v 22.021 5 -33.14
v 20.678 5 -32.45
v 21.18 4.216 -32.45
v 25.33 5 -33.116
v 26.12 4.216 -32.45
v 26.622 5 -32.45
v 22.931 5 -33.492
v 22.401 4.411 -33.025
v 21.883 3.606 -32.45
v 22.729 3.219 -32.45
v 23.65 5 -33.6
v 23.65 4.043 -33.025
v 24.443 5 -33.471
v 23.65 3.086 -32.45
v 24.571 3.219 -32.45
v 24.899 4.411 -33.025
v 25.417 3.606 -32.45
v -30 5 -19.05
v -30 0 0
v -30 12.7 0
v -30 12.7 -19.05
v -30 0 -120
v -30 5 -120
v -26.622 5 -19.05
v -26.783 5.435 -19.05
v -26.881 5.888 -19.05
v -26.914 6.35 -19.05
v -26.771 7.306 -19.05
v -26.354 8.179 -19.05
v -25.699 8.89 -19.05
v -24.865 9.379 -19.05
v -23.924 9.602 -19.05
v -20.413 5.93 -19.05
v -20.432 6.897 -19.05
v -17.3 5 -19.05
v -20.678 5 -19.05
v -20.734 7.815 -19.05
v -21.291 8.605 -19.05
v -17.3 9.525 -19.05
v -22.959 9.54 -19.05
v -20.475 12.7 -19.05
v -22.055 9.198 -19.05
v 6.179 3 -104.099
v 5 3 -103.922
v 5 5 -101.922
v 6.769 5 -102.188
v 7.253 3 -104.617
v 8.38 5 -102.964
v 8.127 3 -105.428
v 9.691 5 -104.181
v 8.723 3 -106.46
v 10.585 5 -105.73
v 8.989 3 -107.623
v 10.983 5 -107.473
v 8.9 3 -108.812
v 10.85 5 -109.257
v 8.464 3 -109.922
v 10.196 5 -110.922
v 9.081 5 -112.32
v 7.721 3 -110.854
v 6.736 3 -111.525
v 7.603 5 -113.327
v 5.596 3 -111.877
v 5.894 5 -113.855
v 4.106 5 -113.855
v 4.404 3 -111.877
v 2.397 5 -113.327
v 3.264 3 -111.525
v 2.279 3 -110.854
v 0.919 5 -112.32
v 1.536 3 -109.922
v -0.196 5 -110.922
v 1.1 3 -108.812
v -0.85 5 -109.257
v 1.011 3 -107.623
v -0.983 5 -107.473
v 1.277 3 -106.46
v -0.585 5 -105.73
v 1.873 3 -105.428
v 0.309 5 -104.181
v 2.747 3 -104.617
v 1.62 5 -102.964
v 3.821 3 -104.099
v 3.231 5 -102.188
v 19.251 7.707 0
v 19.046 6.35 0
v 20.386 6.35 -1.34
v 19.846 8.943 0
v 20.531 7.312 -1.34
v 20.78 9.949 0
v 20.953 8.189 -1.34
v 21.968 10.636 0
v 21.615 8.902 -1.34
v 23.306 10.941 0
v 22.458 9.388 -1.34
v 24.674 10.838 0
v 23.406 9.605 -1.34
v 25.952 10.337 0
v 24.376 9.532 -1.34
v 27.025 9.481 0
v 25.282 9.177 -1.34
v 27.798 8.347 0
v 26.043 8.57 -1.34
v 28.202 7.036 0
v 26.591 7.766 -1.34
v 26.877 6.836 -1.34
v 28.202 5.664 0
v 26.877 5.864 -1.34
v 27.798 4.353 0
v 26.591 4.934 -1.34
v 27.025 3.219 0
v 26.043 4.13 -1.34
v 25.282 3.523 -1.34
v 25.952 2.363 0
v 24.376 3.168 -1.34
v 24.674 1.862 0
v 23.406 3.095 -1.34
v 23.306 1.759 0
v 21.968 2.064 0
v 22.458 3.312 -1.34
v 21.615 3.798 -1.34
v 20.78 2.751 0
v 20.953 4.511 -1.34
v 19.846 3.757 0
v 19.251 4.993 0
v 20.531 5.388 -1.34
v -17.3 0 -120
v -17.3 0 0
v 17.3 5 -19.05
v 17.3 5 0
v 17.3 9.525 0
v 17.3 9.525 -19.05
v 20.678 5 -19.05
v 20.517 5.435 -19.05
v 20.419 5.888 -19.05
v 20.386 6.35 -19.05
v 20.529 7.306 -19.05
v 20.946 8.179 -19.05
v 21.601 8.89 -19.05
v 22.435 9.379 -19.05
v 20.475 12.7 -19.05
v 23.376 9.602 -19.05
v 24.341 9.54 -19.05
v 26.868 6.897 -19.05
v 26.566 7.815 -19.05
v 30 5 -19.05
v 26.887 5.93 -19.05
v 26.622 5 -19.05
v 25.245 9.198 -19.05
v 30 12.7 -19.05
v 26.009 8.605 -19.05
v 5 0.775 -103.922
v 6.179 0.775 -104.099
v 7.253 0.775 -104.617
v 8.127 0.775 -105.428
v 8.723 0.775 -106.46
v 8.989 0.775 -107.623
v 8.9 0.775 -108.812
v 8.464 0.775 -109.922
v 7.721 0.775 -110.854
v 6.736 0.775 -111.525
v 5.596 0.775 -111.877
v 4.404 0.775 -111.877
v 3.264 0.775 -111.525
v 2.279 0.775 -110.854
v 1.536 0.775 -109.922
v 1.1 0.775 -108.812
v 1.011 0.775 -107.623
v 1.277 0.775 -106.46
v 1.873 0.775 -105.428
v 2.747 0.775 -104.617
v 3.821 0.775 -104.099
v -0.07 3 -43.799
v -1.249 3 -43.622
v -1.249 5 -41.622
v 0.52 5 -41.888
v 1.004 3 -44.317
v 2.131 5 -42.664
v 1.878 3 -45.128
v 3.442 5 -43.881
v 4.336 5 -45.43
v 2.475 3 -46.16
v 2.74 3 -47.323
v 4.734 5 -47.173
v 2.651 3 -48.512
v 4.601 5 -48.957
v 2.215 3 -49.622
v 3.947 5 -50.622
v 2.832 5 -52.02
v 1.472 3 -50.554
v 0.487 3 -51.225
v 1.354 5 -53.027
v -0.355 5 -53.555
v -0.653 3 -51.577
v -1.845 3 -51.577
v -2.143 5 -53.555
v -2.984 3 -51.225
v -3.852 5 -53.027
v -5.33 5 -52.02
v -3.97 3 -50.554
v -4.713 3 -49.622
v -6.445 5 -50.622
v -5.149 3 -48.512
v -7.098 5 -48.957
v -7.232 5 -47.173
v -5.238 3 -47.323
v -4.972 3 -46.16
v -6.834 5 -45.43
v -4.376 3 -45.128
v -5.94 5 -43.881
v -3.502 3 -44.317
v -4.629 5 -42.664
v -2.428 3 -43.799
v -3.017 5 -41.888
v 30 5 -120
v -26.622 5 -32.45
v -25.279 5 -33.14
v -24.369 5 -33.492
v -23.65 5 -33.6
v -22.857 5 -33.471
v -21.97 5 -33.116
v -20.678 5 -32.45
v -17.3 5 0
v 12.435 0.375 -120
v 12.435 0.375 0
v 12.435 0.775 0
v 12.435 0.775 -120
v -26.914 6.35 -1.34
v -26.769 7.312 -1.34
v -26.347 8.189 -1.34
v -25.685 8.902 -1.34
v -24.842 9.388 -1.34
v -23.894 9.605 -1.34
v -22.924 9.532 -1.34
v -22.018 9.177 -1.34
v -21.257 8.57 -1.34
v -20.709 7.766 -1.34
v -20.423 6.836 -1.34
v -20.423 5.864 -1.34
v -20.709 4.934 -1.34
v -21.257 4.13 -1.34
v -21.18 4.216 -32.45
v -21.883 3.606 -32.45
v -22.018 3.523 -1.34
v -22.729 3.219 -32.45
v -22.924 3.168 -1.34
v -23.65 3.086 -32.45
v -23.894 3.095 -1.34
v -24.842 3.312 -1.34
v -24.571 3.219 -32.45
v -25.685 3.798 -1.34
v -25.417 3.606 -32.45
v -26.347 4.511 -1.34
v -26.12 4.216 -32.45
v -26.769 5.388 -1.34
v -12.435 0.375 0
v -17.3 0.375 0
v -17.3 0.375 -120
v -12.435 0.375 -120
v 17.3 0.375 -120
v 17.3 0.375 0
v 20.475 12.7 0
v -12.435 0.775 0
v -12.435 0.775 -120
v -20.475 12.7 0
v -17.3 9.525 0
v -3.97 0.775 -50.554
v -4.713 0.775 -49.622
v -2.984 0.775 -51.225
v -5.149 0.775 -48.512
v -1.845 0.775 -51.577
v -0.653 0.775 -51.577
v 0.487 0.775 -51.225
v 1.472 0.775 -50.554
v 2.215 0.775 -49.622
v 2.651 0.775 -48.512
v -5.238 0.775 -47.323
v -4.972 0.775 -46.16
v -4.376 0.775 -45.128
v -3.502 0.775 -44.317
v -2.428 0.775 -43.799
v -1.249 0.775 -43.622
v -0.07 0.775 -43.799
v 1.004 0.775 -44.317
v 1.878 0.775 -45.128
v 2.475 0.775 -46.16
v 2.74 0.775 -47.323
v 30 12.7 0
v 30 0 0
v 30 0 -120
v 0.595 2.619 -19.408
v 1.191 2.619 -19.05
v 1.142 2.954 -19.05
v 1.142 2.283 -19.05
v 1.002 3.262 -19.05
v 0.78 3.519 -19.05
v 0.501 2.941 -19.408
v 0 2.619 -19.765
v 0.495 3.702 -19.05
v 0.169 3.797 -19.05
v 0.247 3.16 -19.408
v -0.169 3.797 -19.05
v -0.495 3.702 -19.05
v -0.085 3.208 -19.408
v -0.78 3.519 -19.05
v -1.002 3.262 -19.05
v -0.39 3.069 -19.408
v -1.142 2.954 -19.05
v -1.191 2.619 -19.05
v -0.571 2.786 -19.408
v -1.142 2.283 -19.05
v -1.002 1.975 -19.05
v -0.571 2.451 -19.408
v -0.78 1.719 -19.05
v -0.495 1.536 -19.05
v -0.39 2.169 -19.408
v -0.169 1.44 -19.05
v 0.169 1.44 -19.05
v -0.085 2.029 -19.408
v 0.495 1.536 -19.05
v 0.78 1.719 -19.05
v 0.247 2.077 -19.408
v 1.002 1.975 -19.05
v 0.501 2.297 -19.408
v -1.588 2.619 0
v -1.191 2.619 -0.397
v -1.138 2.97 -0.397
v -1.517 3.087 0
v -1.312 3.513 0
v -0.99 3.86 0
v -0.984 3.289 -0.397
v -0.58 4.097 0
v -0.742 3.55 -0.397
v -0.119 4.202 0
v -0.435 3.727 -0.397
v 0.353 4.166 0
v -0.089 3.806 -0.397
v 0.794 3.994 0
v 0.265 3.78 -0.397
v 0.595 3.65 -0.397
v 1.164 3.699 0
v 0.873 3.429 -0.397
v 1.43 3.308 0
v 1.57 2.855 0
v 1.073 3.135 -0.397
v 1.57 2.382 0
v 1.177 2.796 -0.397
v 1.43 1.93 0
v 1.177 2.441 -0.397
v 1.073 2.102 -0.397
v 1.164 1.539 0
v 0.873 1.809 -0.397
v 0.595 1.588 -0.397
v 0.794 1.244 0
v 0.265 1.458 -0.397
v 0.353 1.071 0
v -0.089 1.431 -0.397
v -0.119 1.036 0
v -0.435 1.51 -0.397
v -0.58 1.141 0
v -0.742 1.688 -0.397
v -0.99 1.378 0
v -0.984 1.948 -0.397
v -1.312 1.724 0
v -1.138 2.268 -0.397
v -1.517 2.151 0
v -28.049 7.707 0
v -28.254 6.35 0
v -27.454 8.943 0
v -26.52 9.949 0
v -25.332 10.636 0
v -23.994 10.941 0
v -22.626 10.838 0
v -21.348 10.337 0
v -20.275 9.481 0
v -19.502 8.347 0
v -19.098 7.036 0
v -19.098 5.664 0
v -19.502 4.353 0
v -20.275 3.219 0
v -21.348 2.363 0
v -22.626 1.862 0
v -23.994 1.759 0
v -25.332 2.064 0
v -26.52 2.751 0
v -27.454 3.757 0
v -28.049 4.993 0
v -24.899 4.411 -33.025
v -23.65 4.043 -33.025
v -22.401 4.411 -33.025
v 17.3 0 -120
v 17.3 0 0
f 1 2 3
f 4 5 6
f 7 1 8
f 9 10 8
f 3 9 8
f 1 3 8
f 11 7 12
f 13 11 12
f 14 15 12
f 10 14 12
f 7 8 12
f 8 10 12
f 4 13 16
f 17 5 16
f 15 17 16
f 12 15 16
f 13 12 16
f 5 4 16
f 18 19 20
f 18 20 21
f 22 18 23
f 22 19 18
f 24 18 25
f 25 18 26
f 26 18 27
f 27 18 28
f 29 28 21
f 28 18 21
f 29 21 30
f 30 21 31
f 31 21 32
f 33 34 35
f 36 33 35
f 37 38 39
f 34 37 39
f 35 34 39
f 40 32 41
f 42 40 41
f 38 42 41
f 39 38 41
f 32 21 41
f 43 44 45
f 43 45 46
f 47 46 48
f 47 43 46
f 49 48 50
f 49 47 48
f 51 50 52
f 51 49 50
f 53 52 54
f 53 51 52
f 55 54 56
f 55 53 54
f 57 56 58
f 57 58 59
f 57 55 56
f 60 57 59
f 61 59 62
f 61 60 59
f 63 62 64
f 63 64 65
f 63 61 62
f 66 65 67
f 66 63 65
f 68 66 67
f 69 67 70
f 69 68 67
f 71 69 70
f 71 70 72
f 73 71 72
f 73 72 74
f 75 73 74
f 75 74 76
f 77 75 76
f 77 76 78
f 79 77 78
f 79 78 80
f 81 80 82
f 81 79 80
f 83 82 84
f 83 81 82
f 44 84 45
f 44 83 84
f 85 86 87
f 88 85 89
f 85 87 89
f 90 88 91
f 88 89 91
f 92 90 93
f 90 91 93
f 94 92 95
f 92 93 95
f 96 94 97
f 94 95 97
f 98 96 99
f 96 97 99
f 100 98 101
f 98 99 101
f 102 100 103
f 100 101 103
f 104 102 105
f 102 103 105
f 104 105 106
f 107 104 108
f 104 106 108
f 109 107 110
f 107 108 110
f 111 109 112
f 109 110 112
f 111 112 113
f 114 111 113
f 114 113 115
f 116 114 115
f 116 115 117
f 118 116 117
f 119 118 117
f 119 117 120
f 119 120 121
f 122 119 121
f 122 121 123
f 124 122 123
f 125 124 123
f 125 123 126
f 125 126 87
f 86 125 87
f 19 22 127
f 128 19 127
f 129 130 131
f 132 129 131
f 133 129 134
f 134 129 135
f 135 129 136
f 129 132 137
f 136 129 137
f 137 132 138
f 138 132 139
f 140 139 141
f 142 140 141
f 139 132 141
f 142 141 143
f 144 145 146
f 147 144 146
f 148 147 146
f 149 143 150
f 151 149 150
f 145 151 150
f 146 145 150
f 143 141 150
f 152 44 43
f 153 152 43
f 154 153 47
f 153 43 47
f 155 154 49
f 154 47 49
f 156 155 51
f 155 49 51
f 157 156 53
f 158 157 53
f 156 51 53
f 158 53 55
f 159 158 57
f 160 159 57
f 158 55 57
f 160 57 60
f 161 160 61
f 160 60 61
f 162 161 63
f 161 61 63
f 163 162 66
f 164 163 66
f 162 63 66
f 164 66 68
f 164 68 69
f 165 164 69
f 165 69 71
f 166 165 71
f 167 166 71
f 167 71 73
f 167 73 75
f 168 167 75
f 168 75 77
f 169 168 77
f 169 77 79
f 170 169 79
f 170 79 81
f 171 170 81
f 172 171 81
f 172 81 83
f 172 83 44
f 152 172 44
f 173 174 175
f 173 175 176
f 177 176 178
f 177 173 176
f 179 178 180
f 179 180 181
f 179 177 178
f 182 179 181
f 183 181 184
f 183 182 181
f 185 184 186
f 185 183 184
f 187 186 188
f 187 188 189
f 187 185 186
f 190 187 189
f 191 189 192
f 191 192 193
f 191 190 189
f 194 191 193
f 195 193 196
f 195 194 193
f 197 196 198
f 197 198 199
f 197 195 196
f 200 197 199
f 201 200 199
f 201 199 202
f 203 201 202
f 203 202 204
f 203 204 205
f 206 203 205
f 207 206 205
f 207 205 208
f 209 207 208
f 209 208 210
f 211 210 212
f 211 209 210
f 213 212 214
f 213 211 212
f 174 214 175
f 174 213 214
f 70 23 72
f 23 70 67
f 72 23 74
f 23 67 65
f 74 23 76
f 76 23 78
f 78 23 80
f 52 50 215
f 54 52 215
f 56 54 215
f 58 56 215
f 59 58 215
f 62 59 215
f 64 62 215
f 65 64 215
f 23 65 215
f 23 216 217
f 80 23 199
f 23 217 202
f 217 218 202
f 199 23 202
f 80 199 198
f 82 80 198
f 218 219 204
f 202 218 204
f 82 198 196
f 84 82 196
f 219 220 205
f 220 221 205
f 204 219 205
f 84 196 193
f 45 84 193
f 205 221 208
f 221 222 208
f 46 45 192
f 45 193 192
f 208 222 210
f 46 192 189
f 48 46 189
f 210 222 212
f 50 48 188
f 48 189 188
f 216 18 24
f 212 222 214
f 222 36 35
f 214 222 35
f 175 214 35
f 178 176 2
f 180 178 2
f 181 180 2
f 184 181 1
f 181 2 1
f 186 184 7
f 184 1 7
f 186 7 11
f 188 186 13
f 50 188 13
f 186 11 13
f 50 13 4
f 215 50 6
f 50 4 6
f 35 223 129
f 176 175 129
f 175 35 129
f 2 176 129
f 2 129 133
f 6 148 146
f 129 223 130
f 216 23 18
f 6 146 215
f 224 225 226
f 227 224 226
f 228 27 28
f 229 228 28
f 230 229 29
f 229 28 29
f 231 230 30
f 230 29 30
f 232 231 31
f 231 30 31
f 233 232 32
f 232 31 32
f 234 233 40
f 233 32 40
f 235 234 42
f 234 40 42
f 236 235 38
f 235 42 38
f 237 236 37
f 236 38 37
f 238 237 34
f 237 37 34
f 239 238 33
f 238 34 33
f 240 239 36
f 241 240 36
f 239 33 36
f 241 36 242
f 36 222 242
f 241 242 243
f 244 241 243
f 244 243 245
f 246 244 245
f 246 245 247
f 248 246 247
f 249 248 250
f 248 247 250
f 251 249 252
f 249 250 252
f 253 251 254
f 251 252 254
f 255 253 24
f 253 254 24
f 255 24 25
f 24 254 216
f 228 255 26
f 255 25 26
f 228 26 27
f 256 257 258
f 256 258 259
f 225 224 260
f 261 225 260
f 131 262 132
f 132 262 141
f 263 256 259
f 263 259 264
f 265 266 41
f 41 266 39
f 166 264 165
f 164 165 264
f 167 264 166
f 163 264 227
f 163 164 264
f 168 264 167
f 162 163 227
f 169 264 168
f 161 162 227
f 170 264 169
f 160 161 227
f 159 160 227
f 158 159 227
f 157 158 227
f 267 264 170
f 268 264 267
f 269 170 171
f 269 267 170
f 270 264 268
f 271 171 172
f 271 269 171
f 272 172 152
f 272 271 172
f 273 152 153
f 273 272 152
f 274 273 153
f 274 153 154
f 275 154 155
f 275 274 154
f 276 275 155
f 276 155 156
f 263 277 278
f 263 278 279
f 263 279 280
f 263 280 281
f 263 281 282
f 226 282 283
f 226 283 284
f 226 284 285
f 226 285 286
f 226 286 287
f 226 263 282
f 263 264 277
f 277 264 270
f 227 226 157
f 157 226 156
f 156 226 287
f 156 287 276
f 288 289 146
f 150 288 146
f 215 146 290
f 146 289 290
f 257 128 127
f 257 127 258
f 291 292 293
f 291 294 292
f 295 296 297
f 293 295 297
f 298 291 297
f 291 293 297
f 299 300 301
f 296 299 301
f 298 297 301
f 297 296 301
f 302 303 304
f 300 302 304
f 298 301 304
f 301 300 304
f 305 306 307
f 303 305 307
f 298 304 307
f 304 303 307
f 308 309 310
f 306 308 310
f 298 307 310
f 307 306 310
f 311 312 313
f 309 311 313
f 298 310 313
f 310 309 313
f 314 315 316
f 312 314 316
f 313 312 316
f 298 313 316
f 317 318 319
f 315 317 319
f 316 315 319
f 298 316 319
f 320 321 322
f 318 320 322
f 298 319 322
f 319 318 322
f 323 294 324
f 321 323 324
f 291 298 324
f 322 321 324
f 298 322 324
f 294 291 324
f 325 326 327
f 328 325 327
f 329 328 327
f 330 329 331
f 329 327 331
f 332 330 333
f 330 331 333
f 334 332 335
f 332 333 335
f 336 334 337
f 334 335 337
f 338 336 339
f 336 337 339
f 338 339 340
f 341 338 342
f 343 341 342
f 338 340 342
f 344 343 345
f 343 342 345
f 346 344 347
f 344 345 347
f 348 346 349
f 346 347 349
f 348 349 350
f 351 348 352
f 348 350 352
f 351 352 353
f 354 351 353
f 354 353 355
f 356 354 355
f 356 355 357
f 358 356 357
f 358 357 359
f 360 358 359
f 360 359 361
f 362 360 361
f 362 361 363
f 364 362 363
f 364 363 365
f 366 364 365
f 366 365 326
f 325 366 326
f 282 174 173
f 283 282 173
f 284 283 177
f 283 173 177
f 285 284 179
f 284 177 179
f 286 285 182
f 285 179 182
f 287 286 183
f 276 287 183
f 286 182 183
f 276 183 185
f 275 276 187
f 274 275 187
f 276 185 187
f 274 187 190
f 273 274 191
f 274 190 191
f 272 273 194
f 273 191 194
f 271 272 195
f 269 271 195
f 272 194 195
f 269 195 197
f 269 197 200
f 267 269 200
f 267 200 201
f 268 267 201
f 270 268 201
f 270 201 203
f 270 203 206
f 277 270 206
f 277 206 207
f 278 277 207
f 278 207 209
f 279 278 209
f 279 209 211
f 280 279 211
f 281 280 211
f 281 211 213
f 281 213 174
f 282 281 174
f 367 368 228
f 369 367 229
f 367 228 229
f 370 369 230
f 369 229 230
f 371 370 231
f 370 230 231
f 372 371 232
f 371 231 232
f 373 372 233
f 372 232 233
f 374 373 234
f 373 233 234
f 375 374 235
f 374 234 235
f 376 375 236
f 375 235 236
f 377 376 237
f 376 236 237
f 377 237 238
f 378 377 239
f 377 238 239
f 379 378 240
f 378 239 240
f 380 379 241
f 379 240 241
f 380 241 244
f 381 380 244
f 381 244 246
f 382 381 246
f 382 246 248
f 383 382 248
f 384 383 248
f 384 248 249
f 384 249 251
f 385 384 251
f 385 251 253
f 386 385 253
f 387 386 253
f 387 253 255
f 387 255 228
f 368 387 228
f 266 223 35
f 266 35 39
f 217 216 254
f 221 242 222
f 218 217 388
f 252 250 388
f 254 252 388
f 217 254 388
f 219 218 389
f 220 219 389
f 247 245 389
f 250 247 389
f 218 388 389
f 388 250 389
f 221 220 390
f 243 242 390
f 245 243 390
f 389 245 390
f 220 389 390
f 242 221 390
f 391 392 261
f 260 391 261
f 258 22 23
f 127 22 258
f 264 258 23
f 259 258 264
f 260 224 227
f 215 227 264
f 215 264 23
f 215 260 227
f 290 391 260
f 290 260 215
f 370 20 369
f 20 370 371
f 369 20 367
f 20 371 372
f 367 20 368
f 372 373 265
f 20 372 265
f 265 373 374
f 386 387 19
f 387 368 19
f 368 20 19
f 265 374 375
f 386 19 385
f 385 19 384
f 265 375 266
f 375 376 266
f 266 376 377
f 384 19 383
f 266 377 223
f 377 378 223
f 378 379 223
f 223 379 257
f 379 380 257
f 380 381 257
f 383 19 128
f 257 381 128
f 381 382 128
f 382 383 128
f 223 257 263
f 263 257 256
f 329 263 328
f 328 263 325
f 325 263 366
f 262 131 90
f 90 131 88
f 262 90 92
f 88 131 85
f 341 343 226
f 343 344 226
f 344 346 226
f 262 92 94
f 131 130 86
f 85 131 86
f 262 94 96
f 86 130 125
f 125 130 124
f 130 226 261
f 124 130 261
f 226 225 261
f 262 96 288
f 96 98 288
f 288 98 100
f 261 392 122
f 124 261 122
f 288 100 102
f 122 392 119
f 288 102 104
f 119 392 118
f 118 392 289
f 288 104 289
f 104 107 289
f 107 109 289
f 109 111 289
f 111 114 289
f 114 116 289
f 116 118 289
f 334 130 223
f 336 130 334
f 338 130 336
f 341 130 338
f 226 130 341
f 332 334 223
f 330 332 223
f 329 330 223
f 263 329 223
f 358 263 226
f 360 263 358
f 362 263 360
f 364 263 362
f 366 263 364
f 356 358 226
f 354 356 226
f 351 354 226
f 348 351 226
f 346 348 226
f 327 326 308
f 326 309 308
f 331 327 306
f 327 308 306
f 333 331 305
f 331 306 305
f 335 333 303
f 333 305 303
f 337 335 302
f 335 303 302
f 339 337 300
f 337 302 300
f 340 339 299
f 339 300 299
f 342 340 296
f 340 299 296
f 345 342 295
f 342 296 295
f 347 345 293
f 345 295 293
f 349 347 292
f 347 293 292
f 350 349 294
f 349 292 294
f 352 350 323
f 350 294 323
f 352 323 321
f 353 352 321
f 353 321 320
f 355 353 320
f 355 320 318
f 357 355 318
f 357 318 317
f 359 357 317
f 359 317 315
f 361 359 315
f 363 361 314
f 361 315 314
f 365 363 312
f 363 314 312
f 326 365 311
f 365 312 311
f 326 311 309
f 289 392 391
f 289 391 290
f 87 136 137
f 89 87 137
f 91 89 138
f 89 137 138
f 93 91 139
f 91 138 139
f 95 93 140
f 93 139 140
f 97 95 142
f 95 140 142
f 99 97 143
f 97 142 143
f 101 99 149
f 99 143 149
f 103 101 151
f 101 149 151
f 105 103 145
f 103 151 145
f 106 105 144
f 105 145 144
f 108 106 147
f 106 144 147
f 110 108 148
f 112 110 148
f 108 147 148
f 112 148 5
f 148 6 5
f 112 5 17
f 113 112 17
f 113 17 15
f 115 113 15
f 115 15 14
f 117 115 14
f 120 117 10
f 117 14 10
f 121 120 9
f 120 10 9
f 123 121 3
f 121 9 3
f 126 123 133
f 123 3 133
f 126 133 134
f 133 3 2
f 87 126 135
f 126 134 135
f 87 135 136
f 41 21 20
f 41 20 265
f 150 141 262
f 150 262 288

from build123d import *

# Parameters (mm, degrees)
SKETCH1_W                                 = 60
SKETCH1_H                                 = 120
BOSS_EXTRUDE1_DEPTH                       = 12.7
SKETCH2_W                                 = 34.6
SKETCH2_H                                 = 7.7
CUT_EXTRUDE1_DEPTH                        = 121
F_3_32_0_09375_DIAMETER_HOLE3_D           = 2.38125
F_3_32_0_09375_DIAMETER_HOLE3_DEPTH       = 19.05
F_3_32_0_09375_DIAMETER_HOLE3_CSINK_D     = 3.175
F_3_32_0_09375_DIAMETER_HOLE3_CSINK_ANGLE = 90
F_3_32_0_09375_DIAMETER_HOLE3_TIP         = 0.715399675
CUT_EXTRUDE2_DEPTH                        = 1
CUT_EXTRUDE2_DEPTH_BACK                   = 121
F_5_16_18_TAPPED_HOLE1_D                  = 6.5278
F_5_16_18_TAPPED_HOLE1_DEPTH              = 32.45
F_5_16_18_TAPPED_HOLE1_CSINK_D            = 9.2075
F_5_16_18_TAPPED_HOLE1_CSINK_ANGLE        = 90
F_5_16_18_TAPPED_HOLE1_TIP                = 1.961148974
CHAMFER1_SIZE                             = 3.175
SKETCH7_R                                 = 4
CUT_EXTRUDE4_DEPTH                        = 6
CHAMFER2_SIZE                             = 2
SKETCH10_W                                = 60
SKETCH10_H                                = 100.95
CUT_EXTRUDE5_DEPTH                        = 7.7
SKETCH11_W                                = 24.87086649
SKETCH11_H                                = 0.4
CUT_EXTRUDE6_DEPTH                        = 121.0000001
SKETCH12_W                                = 34.6
SKETCH12_H                                = 0.374910819
CUT_EXTRUDE7_DEPTH                        = 121


with BuildPart() as part:
    # Sketch1 → Boss-Extrude1 (new body)
    with BuildSketch(Plane(origin=(0, 0, 0), x_dir=(1, 0, 0), z_dir=(0, 1, 0))):
        with Locations((0, 60)):
            Rectangle(SKETCH1_W, SKETCH1_H)
    extrude(amount=BOSS_EXTRUDE1_DEPTH)

    # Sketch2 → Cut-Extrude1 (cut, through all)
    with BuildSketch(Plane.XY):
        with Locations((0, 8.85)):
            Rectangle(SKETCH2_W, SKETCH2_H)
    extrude(amount=-CUT_EXTRUDE1_DEPTH, mode=Mode.SUBTRACT)

    # 3_32 _0.09375_ Diameter Hole3
    with Locations(Plane.XY):
        with Locations((0, 2.61875)):
            CounterSinkHole(F_3_32_0_09375_DIAMETER_HOLE3_D / 2, F_3_32_0_09375_DIAMETER_HOLE3_CSINK_D / 2, depth=F_3_32_0_09375_DIAMETER_HOLE3_DEPTH, counter_sink_angle=F_3_32_0_09375_DIAMETER_HOLE3_CSINK_ANGLE)
            with Locations((0, 0, -(F_3_32_0_09375_DIAMETER_HOLE3_DEPTH + F_3_32_0_09375_DIAMETER_HOLE3_TIP / 2))):  # 118° drill point
                Cone(0, F_3_32_0_09375_DIAMETER_HOLE3_D / 2, F_3_32_0_09375_DIAMETER_HOLE3_TIP, mode=Mode.SUBTRACT)

    # Sketch3 → Cut-Extrude2 (cut, two sides)
    with BuildSketch(Plane.XY) as cut_extrude2_sk:
        with BuildLine():
            Line((-124.818289263, -9.651397294), (-17.3, 0))
            ThreePointArc((-17.3, 0), (0, 0.774910819), (17.3, 0))
            Line((17.3, 0), (124.818289263, -9.651397294))
            Line((124.818289263, -9.651397294), (124.818289263, -225.552596882))
            Line((124.818289263, -225.552596882), (-124.818289263, -225.552596882))
            Line((-124.818289263, -225.552596882), (-124.818289263, -9.651397294))
        make_face()
    extrude(amount=CUT_EXTRUDE2_DEPTH, mode=Mode.SUBTRACT)
    extrude(cut_extrude2_sk.sketch, amount=-CUT_EXTRUDE2_DEPTH_BACK, mode=Mode.SUBTRACT)

    # 5_16-18 Tapped Hole1
    with Locations(Plane.XY):
        with Locations((-23.65, 6.35), (23.65, 6.35)):
            CounterSinkHole(F_5_16_18_TAPPED_HOLE1_D / 2, F_5_16_18_TAPPED_HOLE1_CSINK_D / 2, depth=F_5_16_18_TAPPED_HOLE1_DEPTH, counter_sink_angle=F_5_16_18_TAPPED_HOLE1_CSINK_ANGLE)
            with Locations((0, 0, -(F_5_16_18_TAPPED_HOLE1_DEPTH + F_5_16_18_TAPPED_HOLE1_TIP / 2))):  # 118° drill point
                Cone(0, F_5_16_18_TAPPED_HOLE1_D / 2, F_5_16_18_TAPPED_HOLE1_TIP, mode=Mode.SUBTRACT)

    # Chamfer1
    chamfer1_edges = [part.edges().sort_by_distance(p)[0] for p in [
        (-17.3, 12.7, -60),
        (17.3, 12.7, -60),
    ]]
    chamfer(chamfer1_edges, length=CHAMFER1_SIZE)

    # Sketch7 → Cut-Extrude4 (cut, through all)
    with BuildSketch(Plane(origin=(0, 5, 0), x_dir=(1, 0, 0), z_dir=(0, 1, 0))):
        with Locations(Location((5, 107.9216, 0), (0, 0, 270))):  # turned: the seam where the file's is
            Circle(SKETCH7_R)
        with Locations(Location((-1.2489, 47.6216, 0), (0, 0, 270))):  # turned: the seam where the file's is
            Circle(SKETCH7_R)
    extrude(amount=-CUT_EXTRUDE4_DEPTH, mode=Mode.SUBTRACT)

    # Chamfer2
    chamfer2_edges = [part.edges().sort_by_distance(p)[0] for p in [
        (5, 5, -111.9216),
        (-1.2489, 5, -51.6216),
    ]]
    chamfer(chamfer2_edges, length=CHAMFER2_SIZE)

    # Sketch10 → Cut-Extrude5 (cut)
    with BuildSketch(Plane(origin=(0, 12.7, 0), x_dir=(1, 0, 0), z_dir=(0, 1, 0))):
        with Locations((0, 69.525)):
            Rectangle(SKETCH10_W, SKETCH10_H)
    extrude(amount=-CUT_EXTRUDE5_DEPTH, mode=Mode.SUBTRACT)

    # Sketch11 → Cut-Extrude6 (cut, through all)
    with BuildSketch(Plane.XY):
        with Locations((0, 0.574910819)):
            Rectangle(SKETCH11_W, SKETCH11_H)
    extrude(amount=-CUT_EXTRUDE6_DEPTH, mode=Mode.SUBTRACT)

    # Sketch12 → Cut-Extrude7 (cut, through all)
    with BuildSketch(Plane.XY):
        with Locations((0, 0.18745541)):
            Rectangle(SKETCH12_W, SKETCH12_H)
    extrude(amount=-CUT_EXTRUDE7_DEPTH, mode=Mode.SUBTRACT)


solid = part.part
